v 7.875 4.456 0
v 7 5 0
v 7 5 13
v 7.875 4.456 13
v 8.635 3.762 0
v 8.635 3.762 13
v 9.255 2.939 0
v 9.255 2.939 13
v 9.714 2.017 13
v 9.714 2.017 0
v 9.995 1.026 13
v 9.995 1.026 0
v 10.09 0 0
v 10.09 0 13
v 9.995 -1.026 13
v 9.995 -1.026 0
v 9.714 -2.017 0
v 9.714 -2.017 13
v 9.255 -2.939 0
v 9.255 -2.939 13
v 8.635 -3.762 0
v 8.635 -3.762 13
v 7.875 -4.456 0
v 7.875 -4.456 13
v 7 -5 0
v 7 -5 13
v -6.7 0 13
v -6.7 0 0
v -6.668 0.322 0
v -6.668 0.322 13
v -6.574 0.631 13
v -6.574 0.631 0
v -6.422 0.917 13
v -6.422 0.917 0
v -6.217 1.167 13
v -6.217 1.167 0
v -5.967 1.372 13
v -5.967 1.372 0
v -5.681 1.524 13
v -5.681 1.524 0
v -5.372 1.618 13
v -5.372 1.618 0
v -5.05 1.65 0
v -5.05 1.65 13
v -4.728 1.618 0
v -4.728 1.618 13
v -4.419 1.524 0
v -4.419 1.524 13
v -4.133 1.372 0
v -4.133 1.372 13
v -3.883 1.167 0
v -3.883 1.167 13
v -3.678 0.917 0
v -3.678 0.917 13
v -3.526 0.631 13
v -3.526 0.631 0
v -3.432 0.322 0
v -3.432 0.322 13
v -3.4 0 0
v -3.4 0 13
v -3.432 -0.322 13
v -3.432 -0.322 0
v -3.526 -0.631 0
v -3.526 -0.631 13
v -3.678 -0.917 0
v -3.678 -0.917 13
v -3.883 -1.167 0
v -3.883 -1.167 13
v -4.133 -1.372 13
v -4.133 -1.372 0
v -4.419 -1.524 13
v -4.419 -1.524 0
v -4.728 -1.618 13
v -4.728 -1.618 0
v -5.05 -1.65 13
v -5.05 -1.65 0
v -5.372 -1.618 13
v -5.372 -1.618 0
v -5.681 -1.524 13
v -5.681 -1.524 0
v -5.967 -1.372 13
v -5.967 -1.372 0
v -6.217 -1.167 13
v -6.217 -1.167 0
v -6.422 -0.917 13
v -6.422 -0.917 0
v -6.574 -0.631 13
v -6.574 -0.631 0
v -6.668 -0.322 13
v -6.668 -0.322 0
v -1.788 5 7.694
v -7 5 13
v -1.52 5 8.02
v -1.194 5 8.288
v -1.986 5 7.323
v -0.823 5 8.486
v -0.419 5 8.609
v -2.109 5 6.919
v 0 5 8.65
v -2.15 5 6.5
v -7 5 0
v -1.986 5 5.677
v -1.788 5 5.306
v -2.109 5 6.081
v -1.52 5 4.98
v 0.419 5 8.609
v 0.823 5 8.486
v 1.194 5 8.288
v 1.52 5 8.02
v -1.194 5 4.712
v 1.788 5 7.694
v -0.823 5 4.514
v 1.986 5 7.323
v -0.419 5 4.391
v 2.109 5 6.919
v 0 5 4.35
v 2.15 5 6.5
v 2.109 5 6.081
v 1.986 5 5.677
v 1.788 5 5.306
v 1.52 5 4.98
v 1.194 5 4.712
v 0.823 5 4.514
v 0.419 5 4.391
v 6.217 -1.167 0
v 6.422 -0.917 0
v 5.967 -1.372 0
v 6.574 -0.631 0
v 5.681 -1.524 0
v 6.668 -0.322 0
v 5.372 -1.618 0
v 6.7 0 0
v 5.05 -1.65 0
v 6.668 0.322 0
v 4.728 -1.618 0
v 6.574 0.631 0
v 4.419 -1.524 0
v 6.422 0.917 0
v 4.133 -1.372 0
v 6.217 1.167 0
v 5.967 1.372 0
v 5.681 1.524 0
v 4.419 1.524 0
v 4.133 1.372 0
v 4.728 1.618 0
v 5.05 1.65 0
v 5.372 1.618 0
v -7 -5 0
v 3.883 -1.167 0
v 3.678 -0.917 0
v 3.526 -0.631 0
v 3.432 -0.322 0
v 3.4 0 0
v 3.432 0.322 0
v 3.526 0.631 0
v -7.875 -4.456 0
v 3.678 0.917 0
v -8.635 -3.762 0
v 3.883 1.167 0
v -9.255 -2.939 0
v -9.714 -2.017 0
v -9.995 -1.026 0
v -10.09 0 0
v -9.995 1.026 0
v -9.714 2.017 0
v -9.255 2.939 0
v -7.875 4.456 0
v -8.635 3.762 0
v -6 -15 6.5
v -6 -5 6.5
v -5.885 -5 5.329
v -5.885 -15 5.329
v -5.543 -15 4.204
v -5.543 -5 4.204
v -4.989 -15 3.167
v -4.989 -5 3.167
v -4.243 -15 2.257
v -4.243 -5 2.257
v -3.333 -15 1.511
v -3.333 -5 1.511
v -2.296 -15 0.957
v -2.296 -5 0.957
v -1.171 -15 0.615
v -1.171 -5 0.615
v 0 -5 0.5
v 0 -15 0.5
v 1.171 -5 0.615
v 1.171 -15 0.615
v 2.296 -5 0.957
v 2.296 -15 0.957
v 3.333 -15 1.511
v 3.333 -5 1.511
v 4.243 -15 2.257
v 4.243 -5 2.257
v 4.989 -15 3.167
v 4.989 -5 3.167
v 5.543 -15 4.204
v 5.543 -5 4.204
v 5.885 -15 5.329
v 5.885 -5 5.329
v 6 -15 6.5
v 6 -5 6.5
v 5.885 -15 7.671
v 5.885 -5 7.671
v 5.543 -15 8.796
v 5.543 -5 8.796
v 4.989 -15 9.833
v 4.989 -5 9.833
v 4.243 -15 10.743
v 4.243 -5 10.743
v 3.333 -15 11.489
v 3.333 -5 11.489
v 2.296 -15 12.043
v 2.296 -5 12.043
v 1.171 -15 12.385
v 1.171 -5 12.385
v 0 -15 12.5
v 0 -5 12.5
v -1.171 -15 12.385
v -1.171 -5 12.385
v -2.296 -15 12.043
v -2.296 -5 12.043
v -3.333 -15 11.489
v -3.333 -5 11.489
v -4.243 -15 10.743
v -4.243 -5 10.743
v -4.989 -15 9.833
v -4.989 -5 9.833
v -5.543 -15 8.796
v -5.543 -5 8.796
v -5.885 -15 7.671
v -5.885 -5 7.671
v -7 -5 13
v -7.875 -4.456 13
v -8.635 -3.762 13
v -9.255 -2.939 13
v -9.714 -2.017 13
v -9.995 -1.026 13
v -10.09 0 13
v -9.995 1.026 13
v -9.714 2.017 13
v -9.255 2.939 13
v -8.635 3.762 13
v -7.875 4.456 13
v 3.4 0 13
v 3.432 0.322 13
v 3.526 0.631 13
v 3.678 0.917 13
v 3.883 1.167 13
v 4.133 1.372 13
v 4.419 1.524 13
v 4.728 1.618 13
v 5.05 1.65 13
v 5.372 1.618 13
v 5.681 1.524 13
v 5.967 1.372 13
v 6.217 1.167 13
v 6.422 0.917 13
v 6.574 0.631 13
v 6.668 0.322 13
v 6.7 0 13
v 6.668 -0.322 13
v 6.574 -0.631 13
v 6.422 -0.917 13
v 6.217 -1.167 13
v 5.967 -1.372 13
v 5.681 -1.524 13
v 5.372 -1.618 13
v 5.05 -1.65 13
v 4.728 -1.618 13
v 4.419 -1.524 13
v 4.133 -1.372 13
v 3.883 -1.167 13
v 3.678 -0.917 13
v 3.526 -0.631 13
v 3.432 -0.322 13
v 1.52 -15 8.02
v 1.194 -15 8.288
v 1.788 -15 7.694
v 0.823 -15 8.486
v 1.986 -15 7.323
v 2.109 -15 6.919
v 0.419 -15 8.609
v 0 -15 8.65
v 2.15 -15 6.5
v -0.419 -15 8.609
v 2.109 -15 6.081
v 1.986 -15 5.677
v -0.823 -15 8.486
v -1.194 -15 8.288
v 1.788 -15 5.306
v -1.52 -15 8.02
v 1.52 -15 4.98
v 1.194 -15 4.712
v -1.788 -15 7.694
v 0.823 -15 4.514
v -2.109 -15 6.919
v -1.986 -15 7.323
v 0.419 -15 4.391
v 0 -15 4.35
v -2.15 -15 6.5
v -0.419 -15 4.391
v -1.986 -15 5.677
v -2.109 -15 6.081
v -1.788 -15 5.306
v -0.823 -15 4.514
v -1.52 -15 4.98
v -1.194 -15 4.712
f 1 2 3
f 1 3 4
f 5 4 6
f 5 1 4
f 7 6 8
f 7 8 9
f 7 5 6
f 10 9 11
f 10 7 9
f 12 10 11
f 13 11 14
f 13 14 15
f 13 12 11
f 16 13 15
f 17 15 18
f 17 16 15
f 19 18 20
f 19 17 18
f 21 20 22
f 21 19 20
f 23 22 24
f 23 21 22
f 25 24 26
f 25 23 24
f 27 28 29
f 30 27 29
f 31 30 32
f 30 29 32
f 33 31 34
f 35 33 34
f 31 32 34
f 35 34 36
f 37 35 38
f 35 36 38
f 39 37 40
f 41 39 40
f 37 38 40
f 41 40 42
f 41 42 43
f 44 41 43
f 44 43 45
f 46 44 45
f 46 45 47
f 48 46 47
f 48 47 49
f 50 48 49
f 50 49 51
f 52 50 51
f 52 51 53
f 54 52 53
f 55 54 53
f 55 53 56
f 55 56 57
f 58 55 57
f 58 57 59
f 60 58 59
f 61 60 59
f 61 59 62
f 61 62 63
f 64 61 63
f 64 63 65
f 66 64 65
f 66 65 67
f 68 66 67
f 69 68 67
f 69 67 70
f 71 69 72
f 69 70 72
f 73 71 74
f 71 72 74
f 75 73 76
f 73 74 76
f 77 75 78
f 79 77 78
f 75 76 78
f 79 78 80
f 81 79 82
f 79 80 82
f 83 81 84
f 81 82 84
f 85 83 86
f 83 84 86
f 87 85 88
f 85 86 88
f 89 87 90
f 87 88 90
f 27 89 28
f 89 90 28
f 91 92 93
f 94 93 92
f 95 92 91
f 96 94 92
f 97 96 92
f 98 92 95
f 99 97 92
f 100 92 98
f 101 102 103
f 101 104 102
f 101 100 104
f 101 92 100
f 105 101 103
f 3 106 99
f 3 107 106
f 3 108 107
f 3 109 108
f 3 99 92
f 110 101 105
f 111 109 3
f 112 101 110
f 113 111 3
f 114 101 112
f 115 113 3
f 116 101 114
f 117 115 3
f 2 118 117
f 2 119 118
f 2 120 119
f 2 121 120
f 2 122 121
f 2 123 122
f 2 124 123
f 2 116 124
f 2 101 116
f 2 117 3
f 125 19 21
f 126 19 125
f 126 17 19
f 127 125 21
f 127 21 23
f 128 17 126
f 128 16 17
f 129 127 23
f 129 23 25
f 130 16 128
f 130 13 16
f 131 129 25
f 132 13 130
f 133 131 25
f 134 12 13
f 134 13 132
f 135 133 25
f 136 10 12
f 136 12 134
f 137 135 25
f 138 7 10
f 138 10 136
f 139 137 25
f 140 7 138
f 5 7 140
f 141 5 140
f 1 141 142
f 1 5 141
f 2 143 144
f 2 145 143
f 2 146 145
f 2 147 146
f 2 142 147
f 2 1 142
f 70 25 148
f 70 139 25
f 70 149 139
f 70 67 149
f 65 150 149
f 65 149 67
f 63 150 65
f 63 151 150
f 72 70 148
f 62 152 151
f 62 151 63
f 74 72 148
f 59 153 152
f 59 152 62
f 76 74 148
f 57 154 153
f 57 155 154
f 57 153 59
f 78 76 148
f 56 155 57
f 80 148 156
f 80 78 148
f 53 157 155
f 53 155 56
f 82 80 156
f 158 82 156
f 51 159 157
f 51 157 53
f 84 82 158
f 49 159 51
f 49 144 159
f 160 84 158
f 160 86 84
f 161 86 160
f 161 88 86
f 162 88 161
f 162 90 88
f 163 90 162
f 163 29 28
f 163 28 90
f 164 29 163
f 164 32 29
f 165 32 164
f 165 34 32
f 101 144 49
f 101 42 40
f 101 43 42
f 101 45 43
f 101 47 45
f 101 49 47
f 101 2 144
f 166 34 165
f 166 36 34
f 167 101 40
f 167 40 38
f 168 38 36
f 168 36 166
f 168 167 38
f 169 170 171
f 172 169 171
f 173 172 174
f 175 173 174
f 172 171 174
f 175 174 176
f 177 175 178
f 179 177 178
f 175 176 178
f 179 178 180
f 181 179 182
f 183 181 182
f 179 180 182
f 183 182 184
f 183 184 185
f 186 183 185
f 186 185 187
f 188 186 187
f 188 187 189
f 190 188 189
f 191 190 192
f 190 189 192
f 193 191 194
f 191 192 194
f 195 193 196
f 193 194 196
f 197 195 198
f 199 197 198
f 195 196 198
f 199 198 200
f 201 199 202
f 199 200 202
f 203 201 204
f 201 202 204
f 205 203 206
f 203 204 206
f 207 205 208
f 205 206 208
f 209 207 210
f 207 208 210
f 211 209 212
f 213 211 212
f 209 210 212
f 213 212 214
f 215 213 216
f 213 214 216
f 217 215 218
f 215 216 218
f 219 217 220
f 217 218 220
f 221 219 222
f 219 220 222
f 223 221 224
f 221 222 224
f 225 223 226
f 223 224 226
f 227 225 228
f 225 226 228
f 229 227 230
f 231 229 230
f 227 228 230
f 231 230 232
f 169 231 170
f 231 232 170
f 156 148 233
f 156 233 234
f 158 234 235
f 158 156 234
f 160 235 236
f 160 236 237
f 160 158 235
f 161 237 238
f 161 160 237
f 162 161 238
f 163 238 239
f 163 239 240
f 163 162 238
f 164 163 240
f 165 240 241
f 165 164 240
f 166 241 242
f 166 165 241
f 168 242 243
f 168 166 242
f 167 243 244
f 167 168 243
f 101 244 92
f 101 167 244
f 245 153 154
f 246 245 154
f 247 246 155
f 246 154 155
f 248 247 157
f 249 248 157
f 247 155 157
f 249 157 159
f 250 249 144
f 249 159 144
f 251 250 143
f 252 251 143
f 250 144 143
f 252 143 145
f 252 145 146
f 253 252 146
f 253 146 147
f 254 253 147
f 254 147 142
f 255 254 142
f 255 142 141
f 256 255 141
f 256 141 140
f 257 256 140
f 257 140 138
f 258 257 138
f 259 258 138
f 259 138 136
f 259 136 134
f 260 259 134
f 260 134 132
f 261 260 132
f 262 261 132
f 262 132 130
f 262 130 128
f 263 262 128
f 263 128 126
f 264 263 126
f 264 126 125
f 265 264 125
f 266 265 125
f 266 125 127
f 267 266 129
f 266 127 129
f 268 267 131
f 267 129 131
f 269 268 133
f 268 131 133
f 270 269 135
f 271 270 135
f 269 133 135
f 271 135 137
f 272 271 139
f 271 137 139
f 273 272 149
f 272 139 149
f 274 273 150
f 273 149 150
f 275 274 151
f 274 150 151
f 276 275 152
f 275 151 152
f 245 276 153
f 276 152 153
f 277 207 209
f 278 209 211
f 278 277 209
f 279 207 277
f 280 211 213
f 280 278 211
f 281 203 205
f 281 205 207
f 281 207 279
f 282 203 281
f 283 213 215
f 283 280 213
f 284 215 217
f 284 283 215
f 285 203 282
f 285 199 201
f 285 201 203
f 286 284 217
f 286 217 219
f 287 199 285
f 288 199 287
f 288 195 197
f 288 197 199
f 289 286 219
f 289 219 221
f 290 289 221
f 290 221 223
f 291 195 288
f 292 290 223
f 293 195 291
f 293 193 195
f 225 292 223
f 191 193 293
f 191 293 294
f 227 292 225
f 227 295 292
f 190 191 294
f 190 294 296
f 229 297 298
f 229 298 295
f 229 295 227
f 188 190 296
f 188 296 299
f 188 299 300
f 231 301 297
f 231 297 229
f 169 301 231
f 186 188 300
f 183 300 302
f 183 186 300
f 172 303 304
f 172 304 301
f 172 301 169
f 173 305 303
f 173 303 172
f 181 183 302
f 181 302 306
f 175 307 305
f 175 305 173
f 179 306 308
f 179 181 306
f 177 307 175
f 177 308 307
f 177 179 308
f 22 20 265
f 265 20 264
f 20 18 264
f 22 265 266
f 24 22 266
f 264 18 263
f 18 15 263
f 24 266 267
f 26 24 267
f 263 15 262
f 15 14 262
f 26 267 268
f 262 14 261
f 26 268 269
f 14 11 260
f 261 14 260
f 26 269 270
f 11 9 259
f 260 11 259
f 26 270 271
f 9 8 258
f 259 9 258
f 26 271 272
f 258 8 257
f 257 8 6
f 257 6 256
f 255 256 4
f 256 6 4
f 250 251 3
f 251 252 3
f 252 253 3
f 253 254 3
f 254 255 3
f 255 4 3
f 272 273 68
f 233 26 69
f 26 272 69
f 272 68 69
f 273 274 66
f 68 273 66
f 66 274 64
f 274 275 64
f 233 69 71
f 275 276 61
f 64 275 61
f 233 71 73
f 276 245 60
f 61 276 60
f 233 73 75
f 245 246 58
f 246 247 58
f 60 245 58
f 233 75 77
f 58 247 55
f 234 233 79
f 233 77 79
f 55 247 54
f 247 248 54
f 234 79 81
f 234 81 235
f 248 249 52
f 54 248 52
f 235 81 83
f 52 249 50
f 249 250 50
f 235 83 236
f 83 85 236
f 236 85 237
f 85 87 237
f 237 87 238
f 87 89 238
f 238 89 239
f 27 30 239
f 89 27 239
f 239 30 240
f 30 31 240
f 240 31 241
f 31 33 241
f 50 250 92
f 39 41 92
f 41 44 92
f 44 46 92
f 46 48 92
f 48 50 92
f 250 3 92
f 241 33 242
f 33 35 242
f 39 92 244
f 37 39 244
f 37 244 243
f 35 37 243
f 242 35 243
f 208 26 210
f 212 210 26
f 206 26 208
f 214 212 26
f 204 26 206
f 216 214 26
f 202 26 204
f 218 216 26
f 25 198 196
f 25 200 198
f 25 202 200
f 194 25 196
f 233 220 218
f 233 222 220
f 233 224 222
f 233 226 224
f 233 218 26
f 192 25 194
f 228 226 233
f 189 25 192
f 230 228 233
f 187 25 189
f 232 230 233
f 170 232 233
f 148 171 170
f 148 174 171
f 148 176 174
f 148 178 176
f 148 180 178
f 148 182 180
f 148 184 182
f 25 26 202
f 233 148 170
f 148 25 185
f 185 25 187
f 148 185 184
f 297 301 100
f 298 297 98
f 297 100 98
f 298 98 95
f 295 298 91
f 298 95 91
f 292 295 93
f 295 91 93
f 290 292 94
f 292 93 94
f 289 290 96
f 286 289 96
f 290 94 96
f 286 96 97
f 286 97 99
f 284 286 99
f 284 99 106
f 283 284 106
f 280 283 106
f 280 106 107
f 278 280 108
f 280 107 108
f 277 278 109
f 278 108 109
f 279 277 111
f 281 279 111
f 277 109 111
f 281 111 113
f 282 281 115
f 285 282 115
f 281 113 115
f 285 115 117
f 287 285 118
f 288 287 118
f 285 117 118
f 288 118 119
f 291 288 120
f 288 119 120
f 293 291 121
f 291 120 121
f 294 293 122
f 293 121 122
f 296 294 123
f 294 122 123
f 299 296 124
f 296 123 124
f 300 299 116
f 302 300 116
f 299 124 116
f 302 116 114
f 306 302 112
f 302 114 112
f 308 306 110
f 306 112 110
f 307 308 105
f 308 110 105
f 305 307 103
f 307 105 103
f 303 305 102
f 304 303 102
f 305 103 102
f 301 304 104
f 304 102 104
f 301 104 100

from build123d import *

# Parameters (mm, degrees)
BOSS_EXTRUDE1_DEPTH = 13
SKETCH8_R           = 1.65
CUT_EXTRUDE4_DEPTH  = 14
SKETCH6_R           = 6
BOSS_EXTRUDE2_DEPTH = 10
SKETCH4_R           = 2.15
CUT_EXTRUDE3_DEPTH  = 20


with BuildPart() as part:
    # Sketch2 → Boss-Extrude1 (new body)
    with BuildSketch(Plane.XY):
        with BuildLine():
            Line((7, -5), (-7, -5))
            ThreePointArc((-7, -5), (-10.090169944, 0), (-7, 5))
            Line((-7, 5), (7, 5))
            ThreePointArc((7, 5), (10.090169944, 0), (7, -5))
        make_face()
    extrude(amount=BOSS_EXTRUDE1_DEPTH)

    # Sketch8 → Cut-Extrude4 (cut, through all)
    with BuildSketch(Plane(origin=(0, 0, 0), x_dir=(-1, 0, 0), z_dir=(0, 0, -1))):
        with Locations((-5.05, 0)):
            Circle(SKETCH8_R)
        with Locations((5.05, 0)):
            Circle(SKETCH8_R)
    extrude(amount=-CUT_EXTRUDE4_DEPTH, mode=Mode.SUBTRACT)

    # Sketch6 → Boss-Extrude2 (add)
    with BuildSketch(Plane.XZ.offset(5)):
        with Locations(Location((0, 6.5, 0), (0, 0, 180))):  # turned: the seam where the file's is
            Circle(SKETCH6_R)
    extrude(amount=BOSS_EXTRUDE2_DEPTH)

    # Sketch4 → Cut-Extrude3 (cut)
    with BuildSketch(Plane(origin=(0, 5, 0), x_dir=(1, 0, 0), z_dir=(0, 1, 0))):
        with Locations(Location((0, -6.5, 0), (0, 0, 180))):  # turned: the seam where the file's is
            Circle(SKETCH4_R)
    extrude(amount=-CUT_EXTRUDE3_DEPTH, mode=Mode.SUBTRACT)


solid = part.part
